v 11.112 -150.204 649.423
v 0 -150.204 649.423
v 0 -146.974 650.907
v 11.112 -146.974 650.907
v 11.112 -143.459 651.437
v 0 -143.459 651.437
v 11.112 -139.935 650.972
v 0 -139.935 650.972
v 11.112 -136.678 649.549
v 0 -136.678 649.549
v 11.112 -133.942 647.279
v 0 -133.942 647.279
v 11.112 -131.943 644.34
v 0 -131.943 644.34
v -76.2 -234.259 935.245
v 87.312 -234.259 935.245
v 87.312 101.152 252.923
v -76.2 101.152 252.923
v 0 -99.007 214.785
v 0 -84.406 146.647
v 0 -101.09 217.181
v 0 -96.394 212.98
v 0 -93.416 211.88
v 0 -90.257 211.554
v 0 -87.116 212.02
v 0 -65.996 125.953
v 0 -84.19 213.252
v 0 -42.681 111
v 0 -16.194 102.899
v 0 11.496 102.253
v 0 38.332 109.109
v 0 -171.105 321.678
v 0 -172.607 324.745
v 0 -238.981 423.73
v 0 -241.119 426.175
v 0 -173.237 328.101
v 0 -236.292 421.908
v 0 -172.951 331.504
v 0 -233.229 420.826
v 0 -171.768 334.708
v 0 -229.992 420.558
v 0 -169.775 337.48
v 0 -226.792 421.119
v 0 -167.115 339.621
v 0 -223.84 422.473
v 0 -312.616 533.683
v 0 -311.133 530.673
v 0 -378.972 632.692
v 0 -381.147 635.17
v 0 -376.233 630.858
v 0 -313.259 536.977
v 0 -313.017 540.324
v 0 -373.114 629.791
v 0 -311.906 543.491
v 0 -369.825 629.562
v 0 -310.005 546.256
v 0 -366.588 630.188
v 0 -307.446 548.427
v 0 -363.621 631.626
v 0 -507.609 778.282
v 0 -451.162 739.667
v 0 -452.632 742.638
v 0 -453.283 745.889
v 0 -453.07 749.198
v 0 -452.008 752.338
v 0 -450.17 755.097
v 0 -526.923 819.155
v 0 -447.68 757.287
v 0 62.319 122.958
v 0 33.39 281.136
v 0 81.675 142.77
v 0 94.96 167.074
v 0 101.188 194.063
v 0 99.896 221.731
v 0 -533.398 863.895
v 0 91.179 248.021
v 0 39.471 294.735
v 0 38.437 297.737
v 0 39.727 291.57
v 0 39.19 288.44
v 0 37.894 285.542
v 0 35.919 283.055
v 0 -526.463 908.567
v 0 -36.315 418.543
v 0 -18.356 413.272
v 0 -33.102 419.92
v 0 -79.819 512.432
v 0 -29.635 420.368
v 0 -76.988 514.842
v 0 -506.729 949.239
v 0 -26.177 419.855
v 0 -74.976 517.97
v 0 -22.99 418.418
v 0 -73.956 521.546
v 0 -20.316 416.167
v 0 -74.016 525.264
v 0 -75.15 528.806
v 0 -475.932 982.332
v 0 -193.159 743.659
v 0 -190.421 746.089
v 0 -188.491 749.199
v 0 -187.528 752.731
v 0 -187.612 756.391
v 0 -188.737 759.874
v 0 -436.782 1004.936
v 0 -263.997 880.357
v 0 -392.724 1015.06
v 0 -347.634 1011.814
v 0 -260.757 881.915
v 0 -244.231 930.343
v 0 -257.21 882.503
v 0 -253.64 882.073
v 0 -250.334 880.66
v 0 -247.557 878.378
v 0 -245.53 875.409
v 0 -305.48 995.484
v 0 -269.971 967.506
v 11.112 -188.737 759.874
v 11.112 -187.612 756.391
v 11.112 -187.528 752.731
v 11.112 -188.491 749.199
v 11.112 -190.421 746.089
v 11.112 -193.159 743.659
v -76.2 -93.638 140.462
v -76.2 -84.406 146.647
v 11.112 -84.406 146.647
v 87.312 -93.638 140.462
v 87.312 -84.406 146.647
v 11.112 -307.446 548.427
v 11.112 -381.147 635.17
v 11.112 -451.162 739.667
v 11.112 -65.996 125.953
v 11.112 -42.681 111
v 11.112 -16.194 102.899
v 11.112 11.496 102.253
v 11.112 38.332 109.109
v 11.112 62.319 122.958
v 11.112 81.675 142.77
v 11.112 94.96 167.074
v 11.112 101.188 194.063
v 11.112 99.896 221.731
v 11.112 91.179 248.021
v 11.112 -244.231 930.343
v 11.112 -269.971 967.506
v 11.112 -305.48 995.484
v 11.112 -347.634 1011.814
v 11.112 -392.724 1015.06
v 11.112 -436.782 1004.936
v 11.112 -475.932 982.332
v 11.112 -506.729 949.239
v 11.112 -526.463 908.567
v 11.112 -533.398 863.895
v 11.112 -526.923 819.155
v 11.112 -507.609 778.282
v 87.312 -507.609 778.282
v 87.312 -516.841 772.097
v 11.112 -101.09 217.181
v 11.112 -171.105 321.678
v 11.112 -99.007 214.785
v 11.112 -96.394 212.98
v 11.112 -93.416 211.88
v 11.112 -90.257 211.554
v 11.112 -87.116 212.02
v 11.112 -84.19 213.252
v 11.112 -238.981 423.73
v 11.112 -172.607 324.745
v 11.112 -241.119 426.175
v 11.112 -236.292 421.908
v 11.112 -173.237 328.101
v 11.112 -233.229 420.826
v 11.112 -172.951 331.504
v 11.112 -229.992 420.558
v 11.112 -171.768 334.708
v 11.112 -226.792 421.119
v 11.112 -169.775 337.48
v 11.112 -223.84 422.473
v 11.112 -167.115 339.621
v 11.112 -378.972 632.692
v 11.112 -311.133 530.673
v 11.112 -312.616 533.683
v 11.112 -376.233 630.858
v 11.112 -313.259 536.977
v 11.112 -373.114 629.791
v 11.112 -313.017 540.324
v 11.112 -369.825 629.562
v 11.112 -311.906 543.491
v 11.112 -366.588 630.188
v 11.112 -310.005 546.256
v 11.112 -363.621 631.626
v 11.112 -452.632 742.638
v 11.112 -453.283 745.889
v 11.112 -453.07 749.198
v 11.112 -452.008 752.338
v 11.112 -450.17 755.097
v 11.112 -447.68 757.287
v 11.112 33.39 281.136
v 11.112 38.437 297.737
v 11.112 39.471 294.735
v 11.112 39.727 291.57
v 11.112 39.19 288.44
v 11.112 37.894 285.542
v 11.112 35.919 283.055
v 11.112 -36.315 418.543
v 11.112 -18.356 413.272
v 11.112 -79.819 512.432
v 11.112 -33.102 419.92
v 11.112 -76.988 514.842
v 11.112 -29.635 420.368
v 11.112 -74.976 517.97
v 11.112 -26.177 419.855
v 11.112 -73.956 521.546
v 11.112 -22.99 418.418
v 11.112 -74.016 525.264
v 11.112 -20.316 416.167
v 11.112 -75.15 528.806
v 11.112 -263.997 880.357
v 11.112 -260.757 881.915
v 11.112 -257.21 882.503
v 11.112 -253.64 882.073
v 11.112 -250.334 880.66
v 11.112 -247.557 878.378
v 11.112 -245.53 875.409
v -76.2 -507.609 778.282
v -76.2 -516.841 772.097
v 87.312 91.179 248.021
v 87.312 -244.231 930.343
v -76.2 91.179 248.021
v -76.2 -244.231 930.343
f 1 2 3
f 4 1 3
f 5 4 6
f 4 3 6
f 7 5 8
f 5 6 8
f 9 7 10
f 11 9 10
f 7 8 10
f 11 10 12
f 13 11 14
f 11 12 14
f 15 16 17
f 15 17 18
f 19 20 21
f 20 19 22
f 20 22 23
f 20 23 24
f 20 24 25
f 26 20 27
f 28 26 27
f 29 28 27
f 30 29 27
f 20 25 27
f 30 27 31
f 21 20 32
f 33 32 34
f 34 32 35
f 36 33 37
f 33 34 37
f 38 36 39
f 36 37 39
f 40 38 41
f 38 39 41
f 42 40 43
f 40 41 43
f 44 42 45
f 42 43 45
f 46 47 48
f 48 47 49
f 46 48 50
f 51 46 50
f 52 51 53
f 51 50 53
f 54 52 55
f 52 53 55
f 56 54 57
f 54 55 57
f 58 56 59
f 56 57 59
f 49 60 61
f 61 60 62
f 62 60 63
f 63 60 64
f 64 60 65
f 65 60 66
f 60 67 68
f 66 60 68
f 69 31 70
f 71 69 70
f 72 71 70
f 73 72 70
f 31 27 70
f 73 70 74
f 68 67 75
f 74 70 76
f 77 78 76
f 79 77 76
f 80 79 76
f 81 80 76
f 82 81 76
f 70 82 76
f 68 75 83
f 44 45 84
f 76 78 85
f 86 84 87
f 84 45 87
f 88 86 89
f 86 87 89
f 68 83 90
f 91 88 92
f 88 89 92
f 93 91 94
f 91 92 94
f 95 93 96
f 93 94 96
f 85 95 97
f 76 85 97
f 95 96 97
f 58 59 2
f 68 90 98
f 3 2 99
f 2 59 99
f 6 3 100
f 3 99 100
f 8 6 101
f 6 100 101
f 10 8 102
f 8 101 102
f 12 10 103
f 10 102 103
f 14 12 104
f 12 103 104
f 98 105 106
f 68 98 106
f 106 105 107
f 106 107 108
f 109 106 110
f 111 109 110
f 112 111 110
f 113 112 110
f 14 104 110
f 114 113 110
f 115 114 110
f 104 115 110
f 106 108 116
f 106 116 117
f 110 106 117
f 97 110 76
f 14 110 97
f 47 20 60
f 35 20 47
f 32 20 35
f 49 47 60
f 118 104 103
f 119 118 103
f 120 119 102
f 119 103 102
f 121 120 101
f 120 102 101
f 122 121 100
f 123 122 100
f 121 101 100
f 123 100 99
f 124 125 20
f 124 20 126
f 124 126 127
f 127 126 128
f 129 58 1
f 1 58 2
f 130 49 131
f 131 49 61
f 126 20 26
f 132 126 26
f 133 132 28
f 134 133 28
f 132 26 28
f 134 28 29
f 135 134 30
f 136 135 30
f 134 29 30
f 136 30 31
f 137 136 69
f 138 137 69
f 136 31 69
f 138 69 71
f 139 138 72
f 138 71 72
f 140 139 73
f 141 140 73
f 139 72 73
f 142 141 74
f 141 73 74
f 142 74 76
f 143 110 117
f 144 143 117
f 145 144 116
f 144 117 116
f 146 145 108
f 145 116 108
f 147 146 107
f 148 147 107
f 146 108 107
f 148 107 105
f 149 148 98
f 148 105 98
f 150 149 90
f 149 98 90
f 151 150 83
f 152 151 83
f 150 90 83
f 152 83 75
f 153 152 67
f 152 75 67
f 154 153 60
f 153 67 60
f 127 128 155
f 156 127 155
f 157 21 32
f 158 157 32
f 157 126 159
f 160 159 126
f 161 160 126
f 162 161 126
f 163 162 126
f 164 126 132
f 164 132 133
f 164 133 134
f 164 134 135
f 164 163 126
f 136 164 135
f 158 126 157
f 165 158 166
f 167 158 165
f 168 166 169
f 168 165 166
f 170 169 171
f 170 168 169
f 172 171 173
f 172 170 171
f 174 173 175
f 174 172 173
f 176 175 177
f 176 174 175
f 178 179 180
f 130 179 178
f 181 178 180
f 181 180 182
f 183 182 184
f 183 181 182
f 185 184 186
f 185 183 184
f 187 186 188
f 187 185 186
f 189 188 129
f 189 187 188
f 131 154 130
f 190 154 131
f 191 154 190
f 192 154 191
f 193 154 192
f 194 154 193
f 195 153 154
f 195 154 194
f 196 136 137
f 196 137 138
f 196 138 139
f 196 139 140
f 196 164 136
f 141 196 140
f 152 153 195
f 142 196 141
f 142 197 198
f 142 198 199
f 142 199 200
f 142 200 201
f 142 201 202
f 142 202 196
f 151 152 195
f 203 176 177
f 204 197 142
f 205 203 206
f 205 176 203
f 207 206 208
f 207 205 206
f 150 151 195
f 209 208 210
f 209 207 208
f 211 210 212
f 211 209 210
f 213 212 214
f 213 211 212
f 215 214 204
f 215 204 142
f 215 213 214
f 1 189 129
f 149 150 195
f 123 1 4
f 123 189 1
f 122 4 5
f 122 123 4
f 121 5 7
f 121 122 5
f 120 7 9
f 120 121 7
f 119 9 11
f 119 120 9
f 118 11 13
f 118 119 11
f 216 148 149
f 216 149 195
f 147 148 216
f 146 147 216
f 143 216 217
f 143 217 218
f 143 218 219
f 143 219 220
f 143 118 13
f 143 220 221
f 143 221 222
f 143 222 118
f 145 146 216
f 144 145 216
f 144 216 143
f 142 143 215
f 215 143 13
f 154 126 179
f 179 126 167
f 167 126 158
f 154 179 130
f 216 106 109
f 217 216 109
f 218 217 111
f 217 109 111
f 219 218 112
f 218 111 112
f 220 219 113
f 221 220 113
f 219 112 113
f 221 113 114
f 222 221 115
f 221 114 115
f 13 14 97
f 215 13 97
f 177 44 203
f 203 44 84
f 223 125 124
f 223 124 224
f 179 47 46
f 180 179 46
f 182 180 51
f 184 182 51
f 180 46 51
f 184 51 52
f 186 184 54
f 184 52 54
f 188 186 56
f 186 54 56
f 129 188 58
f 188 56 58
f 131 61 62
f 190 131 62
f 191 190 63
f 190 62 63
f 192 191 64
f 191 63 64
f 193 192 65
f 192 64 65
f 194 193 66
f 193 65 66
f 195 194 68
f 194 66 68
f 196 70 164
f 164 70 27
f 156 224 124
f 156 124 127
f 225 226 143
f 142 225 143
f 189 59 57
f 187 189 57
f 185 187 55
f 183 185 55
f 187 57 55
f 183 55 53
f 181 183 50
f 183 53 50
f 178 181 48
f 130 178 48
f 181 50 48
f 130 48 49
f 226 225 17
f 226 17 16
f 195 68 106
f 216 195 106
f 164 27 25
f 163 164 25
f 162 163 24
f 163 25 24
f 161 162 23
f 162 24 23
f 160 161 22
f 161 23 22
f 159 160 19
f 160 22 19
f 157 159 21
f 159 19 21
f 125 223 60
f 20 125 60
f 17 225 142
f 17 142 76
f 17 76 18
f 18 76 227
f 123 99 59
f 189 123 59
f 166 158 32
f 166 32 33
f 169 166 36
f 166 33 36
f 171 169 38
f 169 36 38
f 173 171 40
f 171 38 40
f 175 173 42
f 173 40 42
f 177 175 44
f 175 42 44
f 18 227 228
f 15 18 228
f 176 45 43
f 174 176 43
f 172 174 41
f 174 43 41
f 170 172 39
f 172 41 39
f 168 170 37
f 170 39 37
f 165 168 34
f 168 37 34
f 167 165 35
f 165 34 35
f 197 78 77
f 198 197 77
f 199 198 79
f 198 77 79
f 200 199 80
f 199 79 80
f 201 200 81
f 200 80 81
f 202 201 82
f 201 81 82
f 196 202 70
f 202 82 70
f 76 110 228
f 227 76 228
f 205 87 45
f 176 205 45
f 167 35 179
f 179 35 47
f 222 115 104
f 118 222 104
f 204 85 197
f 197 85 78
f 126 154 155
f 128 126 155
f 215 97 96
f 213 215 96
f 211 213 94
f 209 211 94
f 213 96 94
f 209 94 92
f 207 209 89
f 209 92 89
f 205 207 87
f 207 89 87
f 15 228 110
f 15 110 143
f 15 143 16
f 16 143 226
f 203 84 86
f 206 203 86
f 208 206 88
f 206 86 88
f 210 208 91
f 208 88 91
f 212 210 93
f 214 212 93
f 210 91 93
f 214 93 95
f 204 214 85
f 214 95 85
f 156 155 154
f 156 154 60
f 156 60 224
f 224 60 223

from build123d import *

# Parameters (mm, degrees)
F2_DEPTH = 11.1125
F3_W     = 76.2
F3_H     = 760.3047809925
F3_W_2   = 11.1125
F4_DEPTH = 11.1125
F5_W     = 76.2
F5_H     = 760.3047809925
F5_W_2   = 11.1125
F6_DEPTH = 11.1125


# Not quite as in the source:
# - a length typed as a fraction of an inch, garbled in the dataset ("3 / 203.2 mm" for 3/8 in), is restored


with BuildPart() as f2:
    # F1 (on face) → F2 (new body)
    with BuildSketch(Plane.YZ):
        with BuildLine():
            Line((91.1791006611, 248.0211066645), (-244.2313490084, 930.3430176805))
            ThreePointArc((-244.2313490084, 930.3430176805), (-457.2, 995.0936292205), (-507.6086509916, 778.282061482))
            Line((-507.6086509916, 778.2820614821), (-84.4057673278, 146.6471358655))
            ThreePointArc((-84.4057673278, 146.6471358655), (50.8, 115.2118189755), (91.1791006611, 248.0211066645))
        make_face()
        with BuildLine():
            ThreePointArc((-171.1045716164, 321.6783965077), (-172.951087632, 331.5040451939), (-167.114914439, 339.6214386156))
            Line((-167.114914439, 339.6214386156), (-36.3148932715, 418.5429465727))
            ThreePointArc((-36.3148932715, 418.5429465727), (-26.1769388687, 419.8548999412), (-18.3564419502, 413.2716508147))
            Line((-18.3564419502, 413.2716508147), (38.4369639182, 297.7374291963))
            ThreePointArc((38.4369639182, 297.7374291963), (39.1903819803, 288.4404814306), (33.3895763356, 281.1362682351))
            Line((33.3895763356, 281.1362682351), (-84.1895763356, 213.2519127894))
            ThreePointArc((-84.1895763356, 213.2519127894), (-93.4156133399, 211.8803743364), (-101.0902972515, 217.1813274006))
            Line((-101.0902972515, 217.1813274006), (-171.1045716164, 321.6783965077))
        make_face(mode=Mode.SUBTRACT)
        with BuildLine():
            ThreePointArc((-311.133120346, 530.6725347217), (-313.0170671845, 540.3240907704), (-307.4457804185, 548.4273341718))
            Line((-307.4457804185, 548.4273341718), (-150.2040222582, 649.4231471517))
            ThreePointArc((-150.2040222582, 649.4231471517), (-139.9349605516, 650.9722969045), (-131.9432536871, 644.3400940516))
            Line((-131.9432536871, 644.3400940516), (-75.1498478186, 528.8058724331))
            ThreePointArc((-75.1498478186, 528.8058724331), (-74.3341151725, 519.7204630371), (-79.8191746138, 512.4318275976))
            Line((-79.8191746138, 512.4318275976), (-223.8400642778, 422.4731671291))
            ThreePointArc((-223.8400642778, 422.4731671291), (-233.2289400031, 420.8264391554), (-241.1188459812, 426.1754656147))
            Line((-241.1188459812, 426.1754656147), (-311.133120346, 530.6725347217))
        make_face(mode=Mode.SUBTRACT)
        with BuildLine():
            ThreePointArc((-451.1616690757, 739.6666729358), (-453.0700486814, 749.1976530431), (-447.6800561765, 757.2865018686))
            Line((-447.6800561765, 757.2865018686), (-263.9965610234, 880.3566198713))
            ThreePointArc((-263.9965610234, 880.3566198713), (-253.6404511337, 882.0731569492), (-245.5300654239, 875.4085372884))
            Line((-245.5300654239, 875.4085372884), (-188.7366595555, 759.87431567))
            ThreePointArc((-188.7366595555, 759.87431567), (-187.8814953559, 750.930274215), (-193.1588501861, 743.6586368923))
            Line((-193.1588501861, 743.6586368923), (-363.6214768428, 631.6256714009))
            ThreePointArc((-363.6214768428, 631.6256714009), (-373.1138065223, 629.7906580687), (-381.1473947108, 635.1696038288))
            Line((-381.1473947108, 635.1696038288), (-451.1616690757, 739.6666729358))
        make_face(mode=Mode.SUBTRACT)
    extrude(amount=F2_DEPTH)

    # F3 (on face) → F4 (join)
    with BuildSketch(Plane(origin=(0, 171.626899801, 84.3670043542), x_dir=(-1, 0, 0), z_dir=(0, 0.8974320931, 0.4411526247))):
        with Locations((-49.2125, 562.5105918184)):
            Rectangle(F3_W, F3_H)
        with Locations((38.1, 562.5105918184)):
            Rectangle(F3_W, F3_H)
        with Locations((-5.55625, 562.5105918184)):
            Rectangle(F3_W_2, F3_H)
    extrude(amount=F4_DEPTH)

    # F5 (on face) → F6 (join)
    with BuildSketch(Plane(origin=(0, 9.558561252, 6.404349287), x_dir=(1, 0, 0), z_dir=(0, -0.8307654265, -0.5566226785))):
        with Locations((-38.1, 548.9639251518)):
            Rectangle(F5_W, F5_H)
        with Locations((49.2125, 548.9639251518)):
            Rectangle(F5_W, F5_H)
        with Locations((5.55625, 548.9639251518)):
            Rectangle(F5_W_2, F5_H)
    extrude(amount=F6_DEPTH)


solid = f2.part
